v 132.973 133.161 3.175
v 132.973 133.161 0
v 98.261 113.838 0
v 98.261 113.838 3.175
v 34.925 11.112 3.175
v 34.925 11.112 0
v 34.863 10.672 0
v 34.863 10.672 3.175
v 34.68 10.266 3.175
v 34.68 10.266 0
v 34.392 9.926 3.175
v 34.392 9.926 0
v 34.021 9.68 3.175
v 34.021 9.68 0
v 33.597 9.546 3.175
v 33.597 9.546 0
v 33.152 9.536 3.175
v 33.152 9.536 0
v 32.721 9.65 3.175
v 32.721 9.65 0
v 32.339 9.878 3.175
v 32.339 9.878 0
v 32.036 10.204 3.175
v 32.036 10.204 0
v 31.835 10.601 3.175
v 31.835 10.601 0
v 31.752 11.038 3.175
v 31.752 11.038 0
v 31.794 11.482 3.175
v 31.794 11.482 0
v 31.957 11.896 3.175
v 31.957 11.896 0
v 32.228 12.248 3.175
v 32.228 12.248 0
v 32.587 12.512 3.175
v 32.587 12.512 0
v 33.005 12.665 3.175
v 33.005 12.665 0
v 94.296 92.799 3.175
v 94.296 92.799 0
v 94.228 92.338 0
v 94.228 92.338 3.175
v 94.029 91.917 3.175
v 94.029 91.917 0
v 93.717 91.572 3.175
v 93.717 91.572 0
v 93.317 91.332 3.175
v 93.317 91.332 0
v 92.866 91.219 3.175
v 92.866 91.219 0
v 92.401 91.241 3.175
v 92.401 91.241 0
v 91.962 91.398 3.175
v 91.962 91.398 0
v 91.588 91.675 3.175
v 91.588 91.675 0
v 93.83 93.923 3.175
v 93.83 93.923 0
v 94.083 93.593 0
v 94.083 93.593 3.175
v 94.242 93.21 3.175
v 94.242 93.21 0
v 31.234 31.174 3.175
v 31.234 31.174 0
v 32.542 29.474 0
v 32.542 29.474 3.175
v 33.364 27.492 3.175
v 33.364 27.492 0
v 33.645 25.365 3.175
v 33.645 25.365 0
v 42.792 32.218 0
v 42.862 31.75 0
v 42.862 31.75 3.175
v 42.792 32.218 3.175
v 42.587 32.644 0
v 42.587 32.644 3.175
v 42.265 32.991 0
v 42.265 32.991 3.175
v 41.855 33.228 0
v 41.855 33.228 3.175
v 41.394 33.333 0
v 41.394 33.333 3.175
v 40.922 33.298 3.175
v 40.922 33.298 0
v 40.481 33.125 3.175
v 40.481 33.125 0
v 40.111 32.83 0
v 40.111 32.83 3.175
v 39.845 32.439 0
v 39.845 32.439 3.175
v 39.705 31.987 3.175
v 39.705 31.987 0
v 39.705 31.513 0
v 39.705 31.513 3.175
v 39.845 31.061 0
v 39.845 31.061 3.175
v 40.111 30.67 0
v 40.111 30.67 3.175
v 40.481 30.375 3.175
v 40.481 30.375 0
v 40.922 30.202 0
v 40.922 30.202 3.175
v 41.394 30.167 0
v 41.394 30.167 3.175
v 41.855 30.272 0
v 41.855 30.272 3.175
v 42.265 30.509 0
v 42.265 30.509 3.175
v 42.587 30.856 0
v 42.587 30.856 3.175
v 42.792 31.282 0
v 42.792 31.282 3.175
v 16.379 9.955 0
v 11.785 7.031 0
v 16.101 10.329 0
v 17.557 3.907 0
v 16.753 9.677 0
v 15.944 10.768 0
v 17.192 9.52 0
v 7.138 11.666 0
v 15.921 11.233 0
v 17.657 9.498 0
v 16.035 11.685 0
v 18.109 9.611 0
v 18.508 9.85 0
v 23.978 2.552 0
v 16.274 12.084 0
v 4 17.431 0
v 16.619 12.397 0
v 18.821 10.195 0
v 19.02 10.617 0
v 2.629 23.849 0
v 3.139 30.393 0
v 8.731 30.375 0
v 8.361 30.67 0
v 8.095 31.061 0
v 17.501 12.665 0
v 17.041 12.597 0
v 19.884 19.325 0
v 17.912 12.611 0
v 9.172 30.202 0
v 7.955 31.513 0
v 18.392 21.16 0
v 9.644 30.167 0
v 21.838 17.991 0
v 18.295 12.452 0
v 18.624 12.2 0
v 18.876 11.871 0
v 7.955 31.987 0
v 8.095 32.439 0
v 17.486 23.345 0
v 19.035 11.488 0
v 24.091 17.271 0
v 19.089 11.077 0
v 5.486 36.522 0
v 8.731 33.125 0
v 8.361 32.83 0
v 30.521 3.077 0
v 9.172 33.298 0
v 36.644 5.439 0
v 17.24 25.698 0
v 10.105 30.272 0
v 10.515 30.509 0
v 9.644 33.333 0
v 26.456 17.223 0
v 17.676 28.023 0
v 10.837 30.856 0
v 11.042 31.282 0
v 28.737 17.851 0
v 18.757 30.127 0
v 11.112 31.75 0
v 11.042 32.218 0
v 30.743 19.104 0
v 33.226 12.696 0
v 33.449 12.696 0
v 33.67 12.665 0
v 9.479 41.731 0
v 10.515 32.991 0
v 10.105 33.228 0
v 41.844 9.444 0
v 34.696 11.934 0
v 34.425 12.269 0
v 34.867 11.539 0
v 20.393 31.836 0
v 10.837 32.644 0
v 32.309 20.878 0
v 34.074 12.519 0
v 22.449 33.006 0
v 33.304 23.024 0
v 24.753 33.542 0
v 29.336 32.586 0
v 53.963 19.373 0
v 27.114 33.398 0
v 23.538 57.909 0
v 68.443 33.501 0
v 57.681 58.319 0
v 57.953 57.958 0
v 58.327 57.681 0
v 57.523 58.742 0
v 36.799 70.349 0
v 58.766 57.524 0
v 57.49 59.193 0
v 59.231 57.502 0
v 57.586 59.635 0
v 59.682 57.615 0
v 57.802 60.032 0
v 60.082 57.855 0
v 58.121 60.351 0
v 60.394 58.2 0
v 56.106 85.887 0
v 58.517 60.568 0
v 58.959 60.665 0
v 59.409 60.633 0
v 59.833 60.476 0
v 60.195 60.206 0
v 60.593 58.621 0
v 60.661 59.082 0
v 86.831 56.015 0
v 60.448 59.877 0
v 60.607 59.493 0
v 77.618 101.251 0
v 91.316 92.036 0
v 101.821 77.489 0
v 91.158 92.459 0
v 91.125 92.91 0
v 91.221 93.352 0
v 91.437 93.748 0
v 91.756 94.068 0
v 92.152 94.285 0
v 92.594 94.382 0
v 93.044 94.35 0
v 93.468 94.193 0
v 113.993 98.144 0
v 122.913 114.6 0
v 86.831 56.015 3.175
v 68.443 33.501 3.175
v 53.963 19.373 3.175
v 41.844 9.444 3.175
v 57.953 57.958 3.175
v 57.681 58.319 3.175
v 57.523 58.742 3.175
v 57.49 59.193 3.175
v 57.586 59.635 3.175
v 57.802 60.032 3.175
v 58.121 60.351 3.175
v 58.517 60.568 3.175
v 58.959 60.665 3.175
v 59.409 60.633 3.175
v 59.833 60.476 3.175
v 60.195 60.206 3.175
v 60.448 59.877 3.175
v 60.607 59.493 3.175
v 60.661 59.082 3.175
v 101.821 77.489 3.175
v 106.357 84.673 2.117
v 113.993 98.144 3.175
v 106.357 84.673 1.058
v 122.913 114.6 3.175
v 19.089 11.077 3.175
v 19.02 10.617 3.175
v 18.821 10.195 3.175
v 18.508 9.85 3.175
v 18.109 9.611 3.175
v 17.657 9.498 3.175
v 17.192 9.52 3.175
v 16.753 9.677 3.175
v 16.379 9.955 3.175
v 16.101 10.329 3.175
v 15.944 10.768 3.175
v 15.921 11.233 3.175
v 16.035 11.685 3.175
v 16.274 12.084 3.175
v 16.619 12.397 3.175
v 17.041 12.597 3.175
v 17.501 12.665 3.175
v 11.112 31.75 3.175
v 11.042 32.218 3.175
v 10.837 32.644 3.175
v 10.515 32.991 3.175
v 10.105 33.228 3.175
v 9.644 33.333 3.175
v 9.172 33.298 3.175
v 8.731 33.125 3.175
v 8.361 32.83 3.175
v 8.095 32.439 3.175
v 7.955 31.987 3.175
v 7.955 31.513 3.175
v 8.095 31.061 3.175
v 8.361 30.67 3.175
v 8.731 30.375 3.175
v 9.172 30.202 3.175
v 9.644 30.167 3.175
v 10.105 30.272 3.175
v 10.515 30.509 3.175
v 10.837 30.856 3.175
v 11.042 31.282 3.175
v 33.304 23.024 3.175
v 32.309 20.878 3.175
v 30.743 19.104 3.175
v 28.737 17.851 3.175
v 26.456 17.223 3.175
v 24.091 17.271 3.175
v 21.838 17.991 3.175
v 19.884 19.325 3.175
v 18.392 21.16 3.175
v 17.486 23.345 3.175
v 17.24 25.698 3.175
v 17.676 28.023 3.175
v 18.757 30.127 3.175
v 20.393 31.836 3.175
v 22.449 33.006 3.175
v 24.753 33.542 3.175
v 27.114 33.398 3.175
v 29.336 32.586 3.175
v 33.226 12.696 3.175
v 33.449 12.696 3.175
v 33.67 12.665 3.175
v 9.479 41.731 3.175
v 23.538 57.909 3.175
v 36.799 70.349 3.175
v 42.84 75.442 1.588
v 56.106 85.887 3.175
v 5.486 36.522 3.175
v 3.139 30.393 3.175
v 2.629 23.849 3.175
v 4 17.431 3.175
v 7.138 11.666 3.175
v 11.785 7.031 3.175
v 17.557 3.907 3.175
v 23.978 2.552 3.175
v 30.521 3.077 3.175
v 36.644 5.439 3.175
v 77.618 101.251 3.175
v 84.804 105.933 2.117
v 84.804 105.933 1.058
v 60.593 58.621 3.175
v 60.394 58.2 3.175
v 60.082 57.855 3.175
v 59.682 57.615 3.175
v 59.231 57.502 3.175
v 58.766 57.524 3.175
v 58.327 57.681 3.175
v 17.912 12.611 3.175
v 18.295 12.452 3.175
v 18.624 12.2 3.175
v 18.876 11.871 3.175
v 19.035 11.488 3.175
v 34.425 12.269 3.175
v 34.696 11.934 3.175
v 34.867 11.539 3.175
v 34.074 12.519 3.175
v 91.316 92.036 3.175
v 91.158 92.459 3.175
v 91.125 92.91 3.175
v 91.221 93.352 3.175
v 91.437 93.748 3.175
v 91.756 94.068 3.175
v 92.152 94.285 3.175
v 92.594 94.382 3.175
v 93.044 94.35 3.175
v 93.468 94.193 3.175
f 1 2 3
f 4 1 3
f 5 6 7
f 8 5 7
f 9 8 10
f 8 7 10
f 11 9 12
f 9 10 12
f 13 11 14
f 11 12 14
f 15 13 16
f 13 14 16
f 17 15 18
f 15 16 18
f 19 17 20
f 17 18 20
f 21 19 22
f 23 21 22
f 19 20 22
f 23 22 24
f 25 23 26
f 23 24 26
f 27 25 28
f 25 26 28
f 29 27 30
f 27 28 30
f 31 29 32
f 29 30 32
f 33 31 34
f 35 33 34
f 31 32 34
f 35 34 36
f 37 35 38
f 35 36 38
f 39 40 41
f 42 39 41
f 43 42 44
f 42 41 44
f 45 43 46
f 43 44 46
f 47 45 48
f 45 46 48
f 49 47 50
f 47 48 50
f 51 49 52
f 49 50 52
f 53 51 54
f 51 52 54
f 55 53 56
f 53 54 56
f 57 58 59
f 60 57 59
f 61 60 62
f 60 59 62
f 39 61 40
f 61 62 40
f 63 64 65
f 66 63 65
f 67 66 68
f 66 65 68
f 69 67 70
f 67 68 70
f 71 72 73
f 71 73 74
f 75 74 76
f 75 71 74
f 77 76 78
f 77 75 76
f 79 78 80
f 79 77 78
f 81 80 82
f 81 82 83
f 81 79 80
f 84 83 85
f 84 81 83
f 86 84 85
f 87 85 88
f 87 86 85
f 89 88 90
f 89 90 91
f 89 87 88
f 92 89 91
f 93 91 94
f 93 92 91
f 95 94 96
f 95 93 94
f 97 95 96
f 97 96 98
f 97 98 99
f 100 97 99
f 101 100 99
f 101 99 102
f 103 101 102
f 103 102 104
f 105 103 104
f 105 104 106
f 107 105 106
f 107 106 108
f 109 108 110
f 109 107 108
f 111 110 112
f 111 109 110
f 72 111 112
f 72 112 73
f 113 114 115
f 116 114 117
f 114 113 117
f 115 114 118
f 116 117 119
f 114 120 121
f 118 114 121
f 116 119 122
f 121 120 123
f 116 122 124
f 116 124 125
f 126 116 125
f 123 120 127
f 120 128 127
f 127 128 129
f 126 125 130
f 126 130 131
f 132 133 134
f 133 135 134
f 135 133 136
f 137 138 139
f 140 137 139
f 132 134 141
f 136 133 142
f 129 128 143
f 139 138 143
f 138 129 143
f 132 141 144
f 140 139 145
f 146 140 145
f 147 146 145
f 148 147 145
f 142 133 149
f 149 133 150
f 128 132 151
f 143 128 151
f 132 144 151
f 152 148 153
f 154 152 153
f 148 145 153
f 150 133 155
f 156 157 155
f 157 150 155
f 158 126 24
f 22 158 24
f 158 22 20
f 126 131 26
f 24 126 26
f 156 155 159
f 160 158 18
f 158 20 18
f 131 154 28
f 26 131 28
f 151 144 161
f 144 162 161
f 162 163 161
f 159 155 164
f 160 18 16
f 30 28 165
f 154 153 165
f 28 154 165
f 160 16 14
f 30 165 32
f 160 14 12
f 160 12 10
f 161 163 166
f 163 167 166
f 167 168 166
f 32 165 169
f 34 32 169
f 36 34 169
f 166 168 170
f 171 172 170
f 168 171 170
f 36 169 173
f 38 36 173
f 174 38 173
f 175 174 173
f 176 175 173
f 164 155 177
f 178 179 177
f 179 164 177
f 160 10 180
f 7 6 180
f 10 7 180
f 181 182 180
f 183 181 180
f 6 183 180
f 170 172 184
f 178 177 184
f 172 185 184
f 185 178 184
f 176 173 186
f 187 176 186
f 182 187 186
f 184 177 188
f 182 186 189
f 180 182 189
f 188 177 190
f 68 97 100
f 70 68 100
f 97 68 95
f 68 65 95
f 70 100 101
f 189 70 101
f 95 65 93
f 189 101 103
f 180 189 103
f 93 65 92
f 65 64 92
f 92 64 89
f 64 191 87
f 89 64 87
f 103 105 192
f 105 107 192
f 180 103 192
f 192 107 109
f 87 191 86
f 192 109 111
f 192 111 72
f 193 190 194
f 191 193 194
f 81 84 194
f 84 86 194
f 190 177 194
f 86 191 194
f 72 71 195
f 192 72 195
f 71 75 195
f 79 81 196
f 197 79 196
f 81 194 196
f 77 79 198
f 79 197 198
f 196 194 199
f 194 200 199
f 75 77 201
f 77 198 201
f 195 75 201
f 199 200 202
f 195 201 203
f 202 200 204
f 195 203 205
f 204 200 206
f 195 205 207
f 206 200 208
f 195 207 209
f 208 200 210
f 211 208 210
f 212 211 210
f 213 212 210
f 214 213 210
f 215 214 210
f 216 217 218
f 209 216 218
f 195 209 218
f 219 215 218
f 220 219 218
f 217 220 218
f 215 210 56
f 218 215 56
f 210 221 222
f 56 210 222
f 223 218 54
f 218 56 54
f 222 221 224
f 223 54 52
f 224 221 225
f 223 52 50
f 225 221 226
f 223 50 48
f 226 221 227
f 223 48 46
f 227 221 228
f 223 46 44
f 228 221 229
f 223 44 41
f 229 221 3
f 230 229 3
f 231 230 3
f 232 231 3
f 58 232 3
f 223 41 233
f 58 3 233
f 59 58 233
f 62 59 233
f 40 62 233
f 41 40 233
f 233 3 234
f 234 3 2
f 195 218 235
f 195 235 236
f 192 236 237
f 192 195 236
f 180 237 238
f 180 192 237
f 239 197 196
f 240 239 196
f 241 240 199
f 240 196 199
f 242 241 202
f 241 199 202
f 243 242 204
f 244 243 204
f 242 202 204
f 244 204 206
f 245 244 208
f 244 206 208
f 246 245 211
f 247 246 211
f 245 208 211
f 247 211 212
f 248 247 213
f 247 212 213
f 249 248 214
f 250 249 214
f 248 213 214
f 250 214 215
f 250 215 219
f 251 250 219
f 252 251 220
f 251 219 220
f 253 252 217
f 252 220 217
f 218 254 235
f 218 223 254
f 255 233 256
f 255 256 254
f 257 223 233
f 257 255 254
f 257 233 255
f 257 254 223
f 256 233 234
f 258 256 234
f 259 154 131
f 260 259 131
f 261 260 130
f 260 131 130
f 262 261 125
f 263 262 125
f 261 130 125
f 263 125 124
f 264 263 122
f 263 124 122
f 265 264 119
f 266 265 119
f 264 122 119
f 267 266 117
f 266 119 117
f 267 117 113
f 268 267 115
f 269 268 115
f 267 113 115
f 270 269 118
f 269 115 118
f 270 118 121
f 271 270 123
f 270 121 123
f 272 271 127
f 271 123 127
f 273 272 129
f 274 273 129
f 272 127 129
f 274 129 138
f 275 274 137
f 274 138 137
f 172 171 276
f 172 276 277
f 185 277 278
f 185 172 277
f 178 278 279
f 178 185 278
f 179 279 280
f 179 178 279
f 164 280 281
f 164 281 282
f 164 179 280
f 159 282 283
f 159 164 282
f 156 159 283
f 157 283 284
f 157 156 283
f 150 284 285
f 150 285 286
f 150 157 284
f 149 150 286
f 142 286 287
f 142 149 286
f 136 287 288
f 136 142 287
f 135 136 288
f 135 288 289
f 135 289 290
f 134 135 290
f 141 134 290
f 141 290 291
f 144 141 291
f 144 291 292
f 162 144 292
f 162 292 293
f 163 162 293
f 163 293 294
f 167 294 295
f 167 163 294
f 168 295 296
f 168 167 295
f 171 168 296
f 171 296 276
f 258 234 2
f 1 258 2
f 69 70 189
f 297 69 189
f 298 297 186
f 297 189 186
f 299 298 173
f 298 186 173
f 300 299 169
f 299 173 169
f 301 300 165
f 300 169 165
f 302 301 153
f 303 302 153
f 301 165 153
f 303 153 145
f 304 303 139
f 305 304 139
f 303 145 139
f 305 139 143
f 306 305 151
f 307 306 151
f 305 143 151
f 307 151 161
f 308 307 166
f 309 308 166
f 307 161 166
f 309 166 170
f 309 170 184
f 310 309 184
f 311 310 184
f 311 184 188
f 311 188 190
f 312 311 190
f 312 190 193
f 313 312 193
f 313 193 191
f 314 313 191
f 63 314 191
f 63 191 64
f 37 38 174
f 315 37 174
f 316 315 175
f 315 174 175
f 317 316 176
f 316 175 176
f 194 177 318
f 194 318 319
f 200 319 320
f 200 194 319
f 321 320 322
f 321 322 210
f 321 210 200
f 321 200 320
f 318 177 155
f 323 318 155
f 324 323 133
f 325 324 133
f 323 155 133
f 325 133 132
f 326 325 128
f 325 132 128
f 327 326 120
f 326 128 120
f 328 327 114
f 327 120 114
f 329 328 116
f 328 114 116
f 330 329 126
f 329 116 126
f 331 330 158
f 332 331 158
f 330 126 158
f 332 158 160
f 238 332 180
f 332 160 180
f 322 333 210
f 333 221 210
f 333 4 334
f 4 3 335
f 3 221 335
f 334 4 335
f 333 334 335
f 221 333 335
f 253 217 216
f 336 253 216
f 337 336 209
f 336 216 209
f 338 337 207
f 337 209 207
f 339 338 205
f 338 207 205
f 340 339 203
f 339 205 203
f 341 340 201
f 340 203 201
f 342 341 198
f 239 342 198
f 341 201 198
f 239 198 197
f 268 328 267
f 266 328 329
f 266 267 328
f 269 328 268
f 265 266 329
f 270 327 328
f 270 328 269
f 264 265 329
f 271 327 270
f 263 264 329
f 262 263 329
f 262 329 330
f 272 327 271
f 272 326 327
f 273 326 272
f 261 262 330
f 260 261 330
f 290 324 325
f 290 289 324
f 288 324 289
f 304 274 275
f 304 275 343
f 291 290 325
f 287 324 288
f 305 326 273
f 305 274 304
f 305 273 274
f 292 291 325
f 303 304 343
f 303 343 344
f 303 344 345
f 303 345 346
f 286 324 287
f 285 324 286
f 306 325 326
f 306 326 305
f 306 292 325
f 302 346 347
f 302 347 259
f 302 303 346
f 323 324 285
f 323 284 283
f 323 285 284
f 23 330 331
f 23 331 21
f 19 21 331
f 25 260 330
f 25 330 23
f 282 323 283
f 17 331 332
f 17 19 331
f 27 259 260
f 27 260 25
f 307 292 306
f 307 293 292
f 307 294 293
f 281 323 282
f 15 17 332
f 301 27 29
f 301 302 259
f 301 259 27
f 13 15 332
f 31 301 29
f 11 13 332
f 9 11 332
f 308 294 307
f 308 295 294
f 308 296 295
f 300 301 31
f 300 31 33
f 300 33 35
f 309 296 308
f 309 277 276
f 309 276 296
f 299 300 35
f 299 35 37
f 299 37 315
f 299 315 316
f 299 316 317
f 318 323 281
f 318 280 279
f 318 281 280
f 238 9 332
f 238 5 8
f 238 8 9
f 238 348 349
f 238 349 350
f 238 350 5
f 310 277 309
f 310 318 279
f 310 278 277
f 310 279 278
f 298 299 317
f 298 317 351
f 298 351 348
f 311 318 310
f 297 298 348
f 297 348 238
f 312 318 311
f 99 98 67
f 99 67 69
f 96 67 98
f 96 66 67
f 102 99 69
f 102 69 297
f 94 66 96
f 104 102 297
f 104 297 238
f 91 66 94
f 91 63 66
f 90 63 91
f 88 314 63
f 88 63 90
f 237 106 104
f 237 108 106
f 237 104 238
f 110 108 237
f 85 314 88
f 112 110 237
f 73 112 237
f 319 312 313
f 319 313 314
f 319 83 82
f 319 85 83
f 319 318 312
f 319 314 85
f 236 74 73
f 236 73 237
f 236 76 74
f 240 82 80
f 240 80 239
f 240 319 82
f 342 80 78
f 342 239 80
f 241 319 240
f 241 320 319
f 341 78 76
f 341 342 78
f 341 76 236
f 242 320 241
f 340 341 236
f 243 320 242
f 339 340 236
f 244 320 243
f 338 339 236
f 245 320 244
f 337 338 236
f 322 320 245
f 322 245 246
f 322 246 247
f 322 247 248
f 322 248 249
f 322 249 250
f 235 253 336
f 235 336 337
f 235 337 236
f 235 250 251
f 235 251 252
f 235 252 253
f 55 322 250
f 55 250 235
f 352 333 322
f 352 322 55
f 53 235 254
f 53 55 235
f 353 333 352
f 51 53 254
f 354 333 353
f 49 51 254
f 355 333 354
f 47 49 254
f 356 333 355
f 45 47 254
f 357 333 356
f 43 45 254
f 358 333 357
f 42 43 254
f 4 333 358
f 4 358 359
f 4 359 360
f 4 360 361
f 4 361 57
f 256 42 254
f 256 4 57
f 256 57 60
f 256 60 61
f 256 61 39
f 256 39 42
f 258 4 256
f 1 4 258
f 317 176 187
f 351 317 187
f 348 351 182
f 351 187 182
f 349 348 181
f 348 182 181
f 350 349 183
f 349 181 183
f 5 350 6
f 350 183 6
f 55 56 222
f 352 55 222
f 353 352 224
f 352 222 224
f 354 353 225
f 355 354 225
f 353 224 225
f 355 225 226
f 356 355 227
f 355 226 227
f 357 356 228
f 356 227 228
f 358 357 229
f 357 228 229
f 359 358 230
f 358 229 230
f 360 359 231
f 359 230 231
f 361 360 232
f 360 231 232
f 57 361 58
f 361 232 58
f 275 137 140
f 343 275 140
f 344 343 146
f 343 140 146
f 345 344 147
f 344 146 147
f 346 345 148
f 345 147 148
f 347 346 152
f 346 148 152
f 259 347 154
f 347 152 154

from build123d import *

# Parameters (mm, degrees)
F0_R     = 1.5875
F1_DEPTH = 3.175


with BuildPart() as f1:
    # F0 (on Top) → F1 (new body)
    with BuildSketch(Plane.XY):
        with BuildLine():
            ThreePointArc((48.298852367, 25.3648877175), (46.5534190331, 34.1258622353), (41.5836577474, 41.5489805011))
            ThreePointArc((41.5836577474, 41.5489805011), (25.5683959748, 48.2245206641), (9.478505781, 41.7309176838))
            ThreePointArc((9.478505781, 41.7309176838), (9.2940469865, 9.1807949339), (41.8436252726, 9.4443655555))
            ThreePointArc((41.8436252726, 9.4443655555), (46.6236666053, 16.7751702782), (48.298852367, 25.3648877175))
        make_face()
        with BuildLine():
            ThreePointArc((19.088852367, 11.0773877175), (16.3788203518, 9.9548557024), (17.501352367, 12.6648877175))
            ThreePointArc((17.501352367, 12.6648877175), (18.6238843821, 12.1999197327), (19.088852367, 11.0773877175))
        make_face(mode=Mode.SUBTRACT)
        with Locations((9.525, 31.75)):
            Circle(F0_R, mode=Mode.SUBTRACT)
        with BuildLine():
            Line((38.1080227106, 38.0648877175), (38.138852367, 38.0648877175))
            Line((38.138852367, 38.0648877175), (38.138852367, 12.6648877175))
            Line((38.138852367, 12.6648877175), (33.669537083, 12.6648877175))
            ThreePointArc((33.669537083, 12.6648877175), (34.5718551189, 12.110760332), (34.925, 11.1125))
            ThreePointArc((34.925, 11.1125), (32.339239668, 9.8781448811), (33.005462917, 12.6648877175))
            Line((33.005462917, 12.6648877175), (17.501352367, 12.6648877175))
            Line((17.501352367, 12.6648877175), (12.738852367, 12.6648877175))
            Line((12.738852367, 12.6648877175), (12.738852367, 38.0648877175))
            Line((12.738852367, 38.0648877175), (38.1080227106, 38.0648877175))
        make_face(mode=Mode.SUBTRACT)
        with Locations((41.275, 31.75)):
            Circle(F0_R, mode=Mode.SUBTRACT)
        with BuildLine():
            Line((57.9526965359, 57.9578523511), (41.5836577474, 41.5489805011))
            ThreePointArc((41.5836577474, 41.5489805011), (46.5534190331, 34.1258622353), (48.298852367, 25.3648877175))
            ThreePointArc((48.298852367, 25.3648877175), (46.6236666053, 16.7751702782), (41.8436252726, 9.4443655555))
            add(Edge.make_bspline(
                [(86.8310062503, 56.0153192292), (83.249706502, 51.2144143314), (63.5484661138, 26.0258843806), (51.3080659428, 17.112891847), (41.8436252726, 9.4443655555)],
                knots=[0.7406020956, 0.7406020956, 0.7406020956, 0.7406020956, 0.7871603002, 1, 1, 1, 1], degree=3))
            ThreePointArc((86.8310062503, 56.0153192292), (75.7950461349, 59.6100245839), (66.4012027896, 66.4269175316))
            Line((66.4012027896, 66.4269175316), (60.1950306165, 60.2056430155))
            ThreePointArc((60.1950306165, 60.2056430155), (60.540152928, 59.6901486915), (60.6613635762, 59.0817476833))
            ThreePointArc((60.6613635762, 59.0817476833), (59.6822645844, 57.6154583315), (57.9526965359, 57.9578523511))
        make_face()
        with BuildLine():
            ThreePointArc((9.478505781, 41.7309176838), (25.5683959748, 48.2245206641), (41.5836577474, 41.5489805011))
            Line((41.5836577474, 41.5489805011), (57.9526965359, 57.9578523511))
            ThreePointArc((57.9526965359, 57.9578523511), (57.949968244, 60.2029147236), (60.1950306165, 60.2056430155))
            Line((60.1950306165, 60.2056430155), (66.4012027896, 66.4269175316))
            ThreePointArc((66.4012027896, 66.4269175316), (59.7830008839, 75.3788925735), (56.1057766209, 85.88681698))
            add(Edge.make_bspline(
                [(9.478505781, 41.7309176838), (17.0929440337, 51.1603431722), (26.371548526, 62.5901940603), (51.3329129213, 82.2718852167), (56.1057766209, 85.88681698)],
                knots=[0, 0, 0, 0, 0.211634739, 0.2581952867, 0.2581952867, 0.2581952867, 0.2581952867], degree=3))
        make_face()
        with BuildLine():
            Line((89.1799820166, 89.261127534), (66.4012027896, 66.4269175316))
            ThreePointArc((66.4012027896, 66.4269175316), (75.7950461349, 59.6100245839), (86.8310062503, 56.0153192292))
            add(Edge.make_bspline(
                [(113.9930376147, 98.1438093202), (107.5652173309, 85.5841385514), (97.0153094729, 69.6678684875), (86.8310062503, 56.0153192292)],
                knots=[0.6082024344, 0.6082024344, 0.6082024344, 0.6082024344, 0.7406020956, 0.7406020956, 0.7406020956, 0.7406020956], degree=3))
            Line((113.9930376147, 98.1438093202), (105.9976837923, 106.1197541654))
            Line((105.9976837923, 106.1197541654), (96.2377675544, 96.3360877642))
            ThreePointArc((96.2377675544, 96.3360877642), (97.3240460353, 94.7135604092), (97.7055586597, 92.7986076491))
            ThreePointArc((97.7055586597, 92.7986076491), (94.6238275456, 88.1834363993), (89.1799820166, 89.261127534))
        make_face()
        with BuildLine():
            add(Edge.make_bspline(
                [(56.1057766209, 85.88681698), (69.7989441385, 96.2579210625), (85.7273267139, 107.1699447817), (98.2606169463, 113.8380390341)],
                knots=[0.2581952867, 0.2581952867, 0.2581952867, 0.2581952867, 0.3917757571, 0.3917757571, 0.3917757571, 0.3917757571], degree=3))
            ThreePointArc((56.1057766209, 85.88681698), (59.7830008839, 75.3788925735), (66.4012027896, 66.4269175316))
            Line((66.4012027896, 66.4269175316), (89.1799820166, 89.261127534))
            ThreePointArc((89.1799820166, 89.261127534), (89.1713946704, 96.327500418), (96.2377675544, 96.3360877642))
            Line((96.2377675544, 96.3360877642), (105.9976837923, 106.1197541654))
            Line((105.9976837923, 106.1197541654), (98.2606169463, 113.8380390341))
        make_face()
        with BuildLine():
            Line((38.138852367, 12.6648877175), (38.138852367, 38.0648877175))
            Line((38.138852367, 38.0648877175), (38.1080227106, 38.0648877175))
            Line((38.1080227106, 38.0648877175), (12.738852367, 38.0648877175))
            Line((12.738852367, 38.0648877175), (12.738852367, 12.6648877175))
            Line((12.738852367, 12.6648877175), (17.501352367, 12.6648877175))
            Line((17.501352367, 12.6648877175), (33.005462917, 12.6648877175))
            ThreePointArc((33.005462917, 12.6648877175), (33.3375, 12.7), (33.669537083, 12.6648877175))
            Line((33.669537083, 12.6648877175), (38.138852367, 12.6648877175))
        make_face()
        with BuildLine():
            ThreePointArc((33.6445749551, 25.3648877175), (17.8596626631, 22.2200877834), (31.2341189545, 31.1742567343))
            ThreePointArc((31.2341189545, 31.1742567343), (33.0180420708, 28.5096876517), (33.6445749551, 25.3648877175))
        make_face(mode=Mode.SUBTRACT)
        with BuildLine():
            Line((105.9976837923, 106.1197541654), (113.9930376147, 98.1438093202))
            add(Edge.make_bspline(
                [(119.0607801069, 119.1260976819), (121.7354589285, 116.3963605732), (119.2349256659, 108.3862220235), (113.9930376147, 98.1438093202)],
                knots=[0.5002304981, 0.5002304981, 0.5002304981, 0.5002304981, 0.6082024344, 0.6082024344, 0.6082024344, 0.6082024344], degree=3))
            ThreePointArc((119.0607801069, 119.1260976819), (119.038672719, 119.1482070061), (119.0165467814, 119.1702977666))
            Line((119.0165467814, 119.1702977666), (105.9976837923, 106.1197541654))
        make_face()
        with BuildLine():
            add(Edge.make_bspline(
                [(98.2606169463, 113.8380390341), (108.3812043908, 119.2225015111), (116.2880200857, 121.8397075452), (119.0165467814, 119.1702977666)],
                knots=[0.3917757571, 0.3917757571, 0.3917757571, 0.3917757571, 0.4996415136, 0.4996415136, 0.4996415136, 0.4996415136], degree=3))
            Line((98.2606169463, 113.8380390341), (105.9976837923, 106.1197541654))
            Line((105.9976837923, 106.1197541654), (119.0165467814, 119.1702977666))
        make_face()
        with BuildLine():
            Line((132.9733085625, 133.1610224797), (119.0165467814, 119.1702977666))
            add(Edge.make_bspline(
                [(119.0165467814, 119.1702977666), (119.0314454842, 119.1557218627), (119.0461897944, 119.1409883361), (119.0607801069, 119.1260976819)],
                knots=[0.4996415136, 0.4996415136, 0.4996415136, 0.4996415136, 0.5002304981, 0.5002304981, 0.5002304981, 0.5002304981], degree=3))
            ThreePointArc((119.0607801069, 119.1260976819), (121.0771249041, 116.9399007111), (122.9126341528, 114.5998132483))
            Line((122.9126341528, 114.5998132483), (132.9733085625, 133.1610224797))
        make_face()
        with BuildLine():
            Line((132.9733085625, 133.1610224797), (114.6029810942, 122.9350930852))
            ThreePointArc((114.6029810942, 122.9350930852), (116.8831644106, 121.1387446745), (119.0165467814, 119.1702977666))
            Line((119.0165467814, 119.1702977666), (132.9733085625, 133.1610224797))
        make_face()
        with BuildLine():
            ThreePointArc((96.2377675544, 96.3360877642), (89.1713946704, 96.327500418), (89.1799820166, 89.261127534))
            Line((89.1799820166, 89.261127534), (91.5877077452, 91.6747123169))
            ThreePointArc((91.5877077452, 91.6747123169), (91.5849794533, 93.9197746894), (93.8300418258, 93.9225029813))
            Line((93.8300418258, 93.9225029813), (96.2377675544, 96.3360877642))
        make_face()
        with BuildLine():
            Line((91.5877077452, 91.6747123169), (89.1799820166, 89.261127534))
            ThreePointArc((89.1799820166, 89.261127534), (94.6238275456, 88.1834363993), (97.7055586597, 92.7986076491))
            ThreePointArc((97.7055586597, 92.7986076491), (97.3240460353, 94.7135604092), (96.2377675544, 96.3360877642))
            Line((96.2377675544, 96.3360877642), (93.8300418258, 93.9225029813))
            ThreePointArc((93.8300418258, 93.9225029813), (94.1751641373, 93.4070086573), (94.2963747855, 92.7986076491))
            ThreePointArc((94.2963747855, 92.7986076491), (93.3172757937, 91.3323182973), (91.5877077452, 91.6747123169))
        make_face()
        with BuildLine():
            add(Edge.make_bspline(
                [(119.0607801069, 119.1260976819), (121.7354589285, 116.3963605732), (119.2349256659, 108.3862220235), (113.9930376147, 98.1438093202)],
                knots=[0.5002304981, 0.5002304981, 0.5002304981, 0.5002304981, 0.6082024344, 0.6082024344, 0.6082024344, 0.6082024344], degree=3))
            Line((113.9930376147, 98.1438093202), (122.9126341528, 114.5998132483))
            ThreePointArc((122.9126341528, 114.5998132483), (121.0771249041, 116.9399007111), (119.0607801069, 119.1260976819))
        make_face()
        with BuildLine():
            ThreePointArc((119.0165467814, 119.1702977666), (116.8831644106, 121.1387446745), (114.6029810942, 122.9350930852))
            Line((114.6029810942, 122.9350930852), (98.2606169463, 113.8380390341))
            add(Edge.make_bspline(
                [(98.2606169463, 113.8380390341), (108.3812043908, 119.2225015111), (116.2880200857, 121.8397075452), (119.0165467814, 119.1702977666)],
                knots=[0.3917757571, 0.3917757571, 0.3917757571, 0.3917757571, 0.4996415136, 0.4996415136, 0.4996415136, 0.4996415136], degree=3))
        make_face()
        with BuildLine():
            add(Edge.make_bspline(
                [(119.0165467814, 119.1702977666), (119.0314454842, 119.1557218627), (119.0461897944, 119.1409883361), (119.0607801069, 119.1260976819)],
                knots=[0.4996415136, 0.4996415136, 0.4996415136, 0.4996415136, 0.5002304981, 0.5002304981, 0.5002304981, 0.5002304981], degree=3))
            ThreePointArc((119.0165467814, 119.1702977666), (119.038672719, 119.1482070061), (119.0607801069, 119.1260976819))
        make_face()
    extrude(amount=F1_DEPTH)


solid = f1.part
